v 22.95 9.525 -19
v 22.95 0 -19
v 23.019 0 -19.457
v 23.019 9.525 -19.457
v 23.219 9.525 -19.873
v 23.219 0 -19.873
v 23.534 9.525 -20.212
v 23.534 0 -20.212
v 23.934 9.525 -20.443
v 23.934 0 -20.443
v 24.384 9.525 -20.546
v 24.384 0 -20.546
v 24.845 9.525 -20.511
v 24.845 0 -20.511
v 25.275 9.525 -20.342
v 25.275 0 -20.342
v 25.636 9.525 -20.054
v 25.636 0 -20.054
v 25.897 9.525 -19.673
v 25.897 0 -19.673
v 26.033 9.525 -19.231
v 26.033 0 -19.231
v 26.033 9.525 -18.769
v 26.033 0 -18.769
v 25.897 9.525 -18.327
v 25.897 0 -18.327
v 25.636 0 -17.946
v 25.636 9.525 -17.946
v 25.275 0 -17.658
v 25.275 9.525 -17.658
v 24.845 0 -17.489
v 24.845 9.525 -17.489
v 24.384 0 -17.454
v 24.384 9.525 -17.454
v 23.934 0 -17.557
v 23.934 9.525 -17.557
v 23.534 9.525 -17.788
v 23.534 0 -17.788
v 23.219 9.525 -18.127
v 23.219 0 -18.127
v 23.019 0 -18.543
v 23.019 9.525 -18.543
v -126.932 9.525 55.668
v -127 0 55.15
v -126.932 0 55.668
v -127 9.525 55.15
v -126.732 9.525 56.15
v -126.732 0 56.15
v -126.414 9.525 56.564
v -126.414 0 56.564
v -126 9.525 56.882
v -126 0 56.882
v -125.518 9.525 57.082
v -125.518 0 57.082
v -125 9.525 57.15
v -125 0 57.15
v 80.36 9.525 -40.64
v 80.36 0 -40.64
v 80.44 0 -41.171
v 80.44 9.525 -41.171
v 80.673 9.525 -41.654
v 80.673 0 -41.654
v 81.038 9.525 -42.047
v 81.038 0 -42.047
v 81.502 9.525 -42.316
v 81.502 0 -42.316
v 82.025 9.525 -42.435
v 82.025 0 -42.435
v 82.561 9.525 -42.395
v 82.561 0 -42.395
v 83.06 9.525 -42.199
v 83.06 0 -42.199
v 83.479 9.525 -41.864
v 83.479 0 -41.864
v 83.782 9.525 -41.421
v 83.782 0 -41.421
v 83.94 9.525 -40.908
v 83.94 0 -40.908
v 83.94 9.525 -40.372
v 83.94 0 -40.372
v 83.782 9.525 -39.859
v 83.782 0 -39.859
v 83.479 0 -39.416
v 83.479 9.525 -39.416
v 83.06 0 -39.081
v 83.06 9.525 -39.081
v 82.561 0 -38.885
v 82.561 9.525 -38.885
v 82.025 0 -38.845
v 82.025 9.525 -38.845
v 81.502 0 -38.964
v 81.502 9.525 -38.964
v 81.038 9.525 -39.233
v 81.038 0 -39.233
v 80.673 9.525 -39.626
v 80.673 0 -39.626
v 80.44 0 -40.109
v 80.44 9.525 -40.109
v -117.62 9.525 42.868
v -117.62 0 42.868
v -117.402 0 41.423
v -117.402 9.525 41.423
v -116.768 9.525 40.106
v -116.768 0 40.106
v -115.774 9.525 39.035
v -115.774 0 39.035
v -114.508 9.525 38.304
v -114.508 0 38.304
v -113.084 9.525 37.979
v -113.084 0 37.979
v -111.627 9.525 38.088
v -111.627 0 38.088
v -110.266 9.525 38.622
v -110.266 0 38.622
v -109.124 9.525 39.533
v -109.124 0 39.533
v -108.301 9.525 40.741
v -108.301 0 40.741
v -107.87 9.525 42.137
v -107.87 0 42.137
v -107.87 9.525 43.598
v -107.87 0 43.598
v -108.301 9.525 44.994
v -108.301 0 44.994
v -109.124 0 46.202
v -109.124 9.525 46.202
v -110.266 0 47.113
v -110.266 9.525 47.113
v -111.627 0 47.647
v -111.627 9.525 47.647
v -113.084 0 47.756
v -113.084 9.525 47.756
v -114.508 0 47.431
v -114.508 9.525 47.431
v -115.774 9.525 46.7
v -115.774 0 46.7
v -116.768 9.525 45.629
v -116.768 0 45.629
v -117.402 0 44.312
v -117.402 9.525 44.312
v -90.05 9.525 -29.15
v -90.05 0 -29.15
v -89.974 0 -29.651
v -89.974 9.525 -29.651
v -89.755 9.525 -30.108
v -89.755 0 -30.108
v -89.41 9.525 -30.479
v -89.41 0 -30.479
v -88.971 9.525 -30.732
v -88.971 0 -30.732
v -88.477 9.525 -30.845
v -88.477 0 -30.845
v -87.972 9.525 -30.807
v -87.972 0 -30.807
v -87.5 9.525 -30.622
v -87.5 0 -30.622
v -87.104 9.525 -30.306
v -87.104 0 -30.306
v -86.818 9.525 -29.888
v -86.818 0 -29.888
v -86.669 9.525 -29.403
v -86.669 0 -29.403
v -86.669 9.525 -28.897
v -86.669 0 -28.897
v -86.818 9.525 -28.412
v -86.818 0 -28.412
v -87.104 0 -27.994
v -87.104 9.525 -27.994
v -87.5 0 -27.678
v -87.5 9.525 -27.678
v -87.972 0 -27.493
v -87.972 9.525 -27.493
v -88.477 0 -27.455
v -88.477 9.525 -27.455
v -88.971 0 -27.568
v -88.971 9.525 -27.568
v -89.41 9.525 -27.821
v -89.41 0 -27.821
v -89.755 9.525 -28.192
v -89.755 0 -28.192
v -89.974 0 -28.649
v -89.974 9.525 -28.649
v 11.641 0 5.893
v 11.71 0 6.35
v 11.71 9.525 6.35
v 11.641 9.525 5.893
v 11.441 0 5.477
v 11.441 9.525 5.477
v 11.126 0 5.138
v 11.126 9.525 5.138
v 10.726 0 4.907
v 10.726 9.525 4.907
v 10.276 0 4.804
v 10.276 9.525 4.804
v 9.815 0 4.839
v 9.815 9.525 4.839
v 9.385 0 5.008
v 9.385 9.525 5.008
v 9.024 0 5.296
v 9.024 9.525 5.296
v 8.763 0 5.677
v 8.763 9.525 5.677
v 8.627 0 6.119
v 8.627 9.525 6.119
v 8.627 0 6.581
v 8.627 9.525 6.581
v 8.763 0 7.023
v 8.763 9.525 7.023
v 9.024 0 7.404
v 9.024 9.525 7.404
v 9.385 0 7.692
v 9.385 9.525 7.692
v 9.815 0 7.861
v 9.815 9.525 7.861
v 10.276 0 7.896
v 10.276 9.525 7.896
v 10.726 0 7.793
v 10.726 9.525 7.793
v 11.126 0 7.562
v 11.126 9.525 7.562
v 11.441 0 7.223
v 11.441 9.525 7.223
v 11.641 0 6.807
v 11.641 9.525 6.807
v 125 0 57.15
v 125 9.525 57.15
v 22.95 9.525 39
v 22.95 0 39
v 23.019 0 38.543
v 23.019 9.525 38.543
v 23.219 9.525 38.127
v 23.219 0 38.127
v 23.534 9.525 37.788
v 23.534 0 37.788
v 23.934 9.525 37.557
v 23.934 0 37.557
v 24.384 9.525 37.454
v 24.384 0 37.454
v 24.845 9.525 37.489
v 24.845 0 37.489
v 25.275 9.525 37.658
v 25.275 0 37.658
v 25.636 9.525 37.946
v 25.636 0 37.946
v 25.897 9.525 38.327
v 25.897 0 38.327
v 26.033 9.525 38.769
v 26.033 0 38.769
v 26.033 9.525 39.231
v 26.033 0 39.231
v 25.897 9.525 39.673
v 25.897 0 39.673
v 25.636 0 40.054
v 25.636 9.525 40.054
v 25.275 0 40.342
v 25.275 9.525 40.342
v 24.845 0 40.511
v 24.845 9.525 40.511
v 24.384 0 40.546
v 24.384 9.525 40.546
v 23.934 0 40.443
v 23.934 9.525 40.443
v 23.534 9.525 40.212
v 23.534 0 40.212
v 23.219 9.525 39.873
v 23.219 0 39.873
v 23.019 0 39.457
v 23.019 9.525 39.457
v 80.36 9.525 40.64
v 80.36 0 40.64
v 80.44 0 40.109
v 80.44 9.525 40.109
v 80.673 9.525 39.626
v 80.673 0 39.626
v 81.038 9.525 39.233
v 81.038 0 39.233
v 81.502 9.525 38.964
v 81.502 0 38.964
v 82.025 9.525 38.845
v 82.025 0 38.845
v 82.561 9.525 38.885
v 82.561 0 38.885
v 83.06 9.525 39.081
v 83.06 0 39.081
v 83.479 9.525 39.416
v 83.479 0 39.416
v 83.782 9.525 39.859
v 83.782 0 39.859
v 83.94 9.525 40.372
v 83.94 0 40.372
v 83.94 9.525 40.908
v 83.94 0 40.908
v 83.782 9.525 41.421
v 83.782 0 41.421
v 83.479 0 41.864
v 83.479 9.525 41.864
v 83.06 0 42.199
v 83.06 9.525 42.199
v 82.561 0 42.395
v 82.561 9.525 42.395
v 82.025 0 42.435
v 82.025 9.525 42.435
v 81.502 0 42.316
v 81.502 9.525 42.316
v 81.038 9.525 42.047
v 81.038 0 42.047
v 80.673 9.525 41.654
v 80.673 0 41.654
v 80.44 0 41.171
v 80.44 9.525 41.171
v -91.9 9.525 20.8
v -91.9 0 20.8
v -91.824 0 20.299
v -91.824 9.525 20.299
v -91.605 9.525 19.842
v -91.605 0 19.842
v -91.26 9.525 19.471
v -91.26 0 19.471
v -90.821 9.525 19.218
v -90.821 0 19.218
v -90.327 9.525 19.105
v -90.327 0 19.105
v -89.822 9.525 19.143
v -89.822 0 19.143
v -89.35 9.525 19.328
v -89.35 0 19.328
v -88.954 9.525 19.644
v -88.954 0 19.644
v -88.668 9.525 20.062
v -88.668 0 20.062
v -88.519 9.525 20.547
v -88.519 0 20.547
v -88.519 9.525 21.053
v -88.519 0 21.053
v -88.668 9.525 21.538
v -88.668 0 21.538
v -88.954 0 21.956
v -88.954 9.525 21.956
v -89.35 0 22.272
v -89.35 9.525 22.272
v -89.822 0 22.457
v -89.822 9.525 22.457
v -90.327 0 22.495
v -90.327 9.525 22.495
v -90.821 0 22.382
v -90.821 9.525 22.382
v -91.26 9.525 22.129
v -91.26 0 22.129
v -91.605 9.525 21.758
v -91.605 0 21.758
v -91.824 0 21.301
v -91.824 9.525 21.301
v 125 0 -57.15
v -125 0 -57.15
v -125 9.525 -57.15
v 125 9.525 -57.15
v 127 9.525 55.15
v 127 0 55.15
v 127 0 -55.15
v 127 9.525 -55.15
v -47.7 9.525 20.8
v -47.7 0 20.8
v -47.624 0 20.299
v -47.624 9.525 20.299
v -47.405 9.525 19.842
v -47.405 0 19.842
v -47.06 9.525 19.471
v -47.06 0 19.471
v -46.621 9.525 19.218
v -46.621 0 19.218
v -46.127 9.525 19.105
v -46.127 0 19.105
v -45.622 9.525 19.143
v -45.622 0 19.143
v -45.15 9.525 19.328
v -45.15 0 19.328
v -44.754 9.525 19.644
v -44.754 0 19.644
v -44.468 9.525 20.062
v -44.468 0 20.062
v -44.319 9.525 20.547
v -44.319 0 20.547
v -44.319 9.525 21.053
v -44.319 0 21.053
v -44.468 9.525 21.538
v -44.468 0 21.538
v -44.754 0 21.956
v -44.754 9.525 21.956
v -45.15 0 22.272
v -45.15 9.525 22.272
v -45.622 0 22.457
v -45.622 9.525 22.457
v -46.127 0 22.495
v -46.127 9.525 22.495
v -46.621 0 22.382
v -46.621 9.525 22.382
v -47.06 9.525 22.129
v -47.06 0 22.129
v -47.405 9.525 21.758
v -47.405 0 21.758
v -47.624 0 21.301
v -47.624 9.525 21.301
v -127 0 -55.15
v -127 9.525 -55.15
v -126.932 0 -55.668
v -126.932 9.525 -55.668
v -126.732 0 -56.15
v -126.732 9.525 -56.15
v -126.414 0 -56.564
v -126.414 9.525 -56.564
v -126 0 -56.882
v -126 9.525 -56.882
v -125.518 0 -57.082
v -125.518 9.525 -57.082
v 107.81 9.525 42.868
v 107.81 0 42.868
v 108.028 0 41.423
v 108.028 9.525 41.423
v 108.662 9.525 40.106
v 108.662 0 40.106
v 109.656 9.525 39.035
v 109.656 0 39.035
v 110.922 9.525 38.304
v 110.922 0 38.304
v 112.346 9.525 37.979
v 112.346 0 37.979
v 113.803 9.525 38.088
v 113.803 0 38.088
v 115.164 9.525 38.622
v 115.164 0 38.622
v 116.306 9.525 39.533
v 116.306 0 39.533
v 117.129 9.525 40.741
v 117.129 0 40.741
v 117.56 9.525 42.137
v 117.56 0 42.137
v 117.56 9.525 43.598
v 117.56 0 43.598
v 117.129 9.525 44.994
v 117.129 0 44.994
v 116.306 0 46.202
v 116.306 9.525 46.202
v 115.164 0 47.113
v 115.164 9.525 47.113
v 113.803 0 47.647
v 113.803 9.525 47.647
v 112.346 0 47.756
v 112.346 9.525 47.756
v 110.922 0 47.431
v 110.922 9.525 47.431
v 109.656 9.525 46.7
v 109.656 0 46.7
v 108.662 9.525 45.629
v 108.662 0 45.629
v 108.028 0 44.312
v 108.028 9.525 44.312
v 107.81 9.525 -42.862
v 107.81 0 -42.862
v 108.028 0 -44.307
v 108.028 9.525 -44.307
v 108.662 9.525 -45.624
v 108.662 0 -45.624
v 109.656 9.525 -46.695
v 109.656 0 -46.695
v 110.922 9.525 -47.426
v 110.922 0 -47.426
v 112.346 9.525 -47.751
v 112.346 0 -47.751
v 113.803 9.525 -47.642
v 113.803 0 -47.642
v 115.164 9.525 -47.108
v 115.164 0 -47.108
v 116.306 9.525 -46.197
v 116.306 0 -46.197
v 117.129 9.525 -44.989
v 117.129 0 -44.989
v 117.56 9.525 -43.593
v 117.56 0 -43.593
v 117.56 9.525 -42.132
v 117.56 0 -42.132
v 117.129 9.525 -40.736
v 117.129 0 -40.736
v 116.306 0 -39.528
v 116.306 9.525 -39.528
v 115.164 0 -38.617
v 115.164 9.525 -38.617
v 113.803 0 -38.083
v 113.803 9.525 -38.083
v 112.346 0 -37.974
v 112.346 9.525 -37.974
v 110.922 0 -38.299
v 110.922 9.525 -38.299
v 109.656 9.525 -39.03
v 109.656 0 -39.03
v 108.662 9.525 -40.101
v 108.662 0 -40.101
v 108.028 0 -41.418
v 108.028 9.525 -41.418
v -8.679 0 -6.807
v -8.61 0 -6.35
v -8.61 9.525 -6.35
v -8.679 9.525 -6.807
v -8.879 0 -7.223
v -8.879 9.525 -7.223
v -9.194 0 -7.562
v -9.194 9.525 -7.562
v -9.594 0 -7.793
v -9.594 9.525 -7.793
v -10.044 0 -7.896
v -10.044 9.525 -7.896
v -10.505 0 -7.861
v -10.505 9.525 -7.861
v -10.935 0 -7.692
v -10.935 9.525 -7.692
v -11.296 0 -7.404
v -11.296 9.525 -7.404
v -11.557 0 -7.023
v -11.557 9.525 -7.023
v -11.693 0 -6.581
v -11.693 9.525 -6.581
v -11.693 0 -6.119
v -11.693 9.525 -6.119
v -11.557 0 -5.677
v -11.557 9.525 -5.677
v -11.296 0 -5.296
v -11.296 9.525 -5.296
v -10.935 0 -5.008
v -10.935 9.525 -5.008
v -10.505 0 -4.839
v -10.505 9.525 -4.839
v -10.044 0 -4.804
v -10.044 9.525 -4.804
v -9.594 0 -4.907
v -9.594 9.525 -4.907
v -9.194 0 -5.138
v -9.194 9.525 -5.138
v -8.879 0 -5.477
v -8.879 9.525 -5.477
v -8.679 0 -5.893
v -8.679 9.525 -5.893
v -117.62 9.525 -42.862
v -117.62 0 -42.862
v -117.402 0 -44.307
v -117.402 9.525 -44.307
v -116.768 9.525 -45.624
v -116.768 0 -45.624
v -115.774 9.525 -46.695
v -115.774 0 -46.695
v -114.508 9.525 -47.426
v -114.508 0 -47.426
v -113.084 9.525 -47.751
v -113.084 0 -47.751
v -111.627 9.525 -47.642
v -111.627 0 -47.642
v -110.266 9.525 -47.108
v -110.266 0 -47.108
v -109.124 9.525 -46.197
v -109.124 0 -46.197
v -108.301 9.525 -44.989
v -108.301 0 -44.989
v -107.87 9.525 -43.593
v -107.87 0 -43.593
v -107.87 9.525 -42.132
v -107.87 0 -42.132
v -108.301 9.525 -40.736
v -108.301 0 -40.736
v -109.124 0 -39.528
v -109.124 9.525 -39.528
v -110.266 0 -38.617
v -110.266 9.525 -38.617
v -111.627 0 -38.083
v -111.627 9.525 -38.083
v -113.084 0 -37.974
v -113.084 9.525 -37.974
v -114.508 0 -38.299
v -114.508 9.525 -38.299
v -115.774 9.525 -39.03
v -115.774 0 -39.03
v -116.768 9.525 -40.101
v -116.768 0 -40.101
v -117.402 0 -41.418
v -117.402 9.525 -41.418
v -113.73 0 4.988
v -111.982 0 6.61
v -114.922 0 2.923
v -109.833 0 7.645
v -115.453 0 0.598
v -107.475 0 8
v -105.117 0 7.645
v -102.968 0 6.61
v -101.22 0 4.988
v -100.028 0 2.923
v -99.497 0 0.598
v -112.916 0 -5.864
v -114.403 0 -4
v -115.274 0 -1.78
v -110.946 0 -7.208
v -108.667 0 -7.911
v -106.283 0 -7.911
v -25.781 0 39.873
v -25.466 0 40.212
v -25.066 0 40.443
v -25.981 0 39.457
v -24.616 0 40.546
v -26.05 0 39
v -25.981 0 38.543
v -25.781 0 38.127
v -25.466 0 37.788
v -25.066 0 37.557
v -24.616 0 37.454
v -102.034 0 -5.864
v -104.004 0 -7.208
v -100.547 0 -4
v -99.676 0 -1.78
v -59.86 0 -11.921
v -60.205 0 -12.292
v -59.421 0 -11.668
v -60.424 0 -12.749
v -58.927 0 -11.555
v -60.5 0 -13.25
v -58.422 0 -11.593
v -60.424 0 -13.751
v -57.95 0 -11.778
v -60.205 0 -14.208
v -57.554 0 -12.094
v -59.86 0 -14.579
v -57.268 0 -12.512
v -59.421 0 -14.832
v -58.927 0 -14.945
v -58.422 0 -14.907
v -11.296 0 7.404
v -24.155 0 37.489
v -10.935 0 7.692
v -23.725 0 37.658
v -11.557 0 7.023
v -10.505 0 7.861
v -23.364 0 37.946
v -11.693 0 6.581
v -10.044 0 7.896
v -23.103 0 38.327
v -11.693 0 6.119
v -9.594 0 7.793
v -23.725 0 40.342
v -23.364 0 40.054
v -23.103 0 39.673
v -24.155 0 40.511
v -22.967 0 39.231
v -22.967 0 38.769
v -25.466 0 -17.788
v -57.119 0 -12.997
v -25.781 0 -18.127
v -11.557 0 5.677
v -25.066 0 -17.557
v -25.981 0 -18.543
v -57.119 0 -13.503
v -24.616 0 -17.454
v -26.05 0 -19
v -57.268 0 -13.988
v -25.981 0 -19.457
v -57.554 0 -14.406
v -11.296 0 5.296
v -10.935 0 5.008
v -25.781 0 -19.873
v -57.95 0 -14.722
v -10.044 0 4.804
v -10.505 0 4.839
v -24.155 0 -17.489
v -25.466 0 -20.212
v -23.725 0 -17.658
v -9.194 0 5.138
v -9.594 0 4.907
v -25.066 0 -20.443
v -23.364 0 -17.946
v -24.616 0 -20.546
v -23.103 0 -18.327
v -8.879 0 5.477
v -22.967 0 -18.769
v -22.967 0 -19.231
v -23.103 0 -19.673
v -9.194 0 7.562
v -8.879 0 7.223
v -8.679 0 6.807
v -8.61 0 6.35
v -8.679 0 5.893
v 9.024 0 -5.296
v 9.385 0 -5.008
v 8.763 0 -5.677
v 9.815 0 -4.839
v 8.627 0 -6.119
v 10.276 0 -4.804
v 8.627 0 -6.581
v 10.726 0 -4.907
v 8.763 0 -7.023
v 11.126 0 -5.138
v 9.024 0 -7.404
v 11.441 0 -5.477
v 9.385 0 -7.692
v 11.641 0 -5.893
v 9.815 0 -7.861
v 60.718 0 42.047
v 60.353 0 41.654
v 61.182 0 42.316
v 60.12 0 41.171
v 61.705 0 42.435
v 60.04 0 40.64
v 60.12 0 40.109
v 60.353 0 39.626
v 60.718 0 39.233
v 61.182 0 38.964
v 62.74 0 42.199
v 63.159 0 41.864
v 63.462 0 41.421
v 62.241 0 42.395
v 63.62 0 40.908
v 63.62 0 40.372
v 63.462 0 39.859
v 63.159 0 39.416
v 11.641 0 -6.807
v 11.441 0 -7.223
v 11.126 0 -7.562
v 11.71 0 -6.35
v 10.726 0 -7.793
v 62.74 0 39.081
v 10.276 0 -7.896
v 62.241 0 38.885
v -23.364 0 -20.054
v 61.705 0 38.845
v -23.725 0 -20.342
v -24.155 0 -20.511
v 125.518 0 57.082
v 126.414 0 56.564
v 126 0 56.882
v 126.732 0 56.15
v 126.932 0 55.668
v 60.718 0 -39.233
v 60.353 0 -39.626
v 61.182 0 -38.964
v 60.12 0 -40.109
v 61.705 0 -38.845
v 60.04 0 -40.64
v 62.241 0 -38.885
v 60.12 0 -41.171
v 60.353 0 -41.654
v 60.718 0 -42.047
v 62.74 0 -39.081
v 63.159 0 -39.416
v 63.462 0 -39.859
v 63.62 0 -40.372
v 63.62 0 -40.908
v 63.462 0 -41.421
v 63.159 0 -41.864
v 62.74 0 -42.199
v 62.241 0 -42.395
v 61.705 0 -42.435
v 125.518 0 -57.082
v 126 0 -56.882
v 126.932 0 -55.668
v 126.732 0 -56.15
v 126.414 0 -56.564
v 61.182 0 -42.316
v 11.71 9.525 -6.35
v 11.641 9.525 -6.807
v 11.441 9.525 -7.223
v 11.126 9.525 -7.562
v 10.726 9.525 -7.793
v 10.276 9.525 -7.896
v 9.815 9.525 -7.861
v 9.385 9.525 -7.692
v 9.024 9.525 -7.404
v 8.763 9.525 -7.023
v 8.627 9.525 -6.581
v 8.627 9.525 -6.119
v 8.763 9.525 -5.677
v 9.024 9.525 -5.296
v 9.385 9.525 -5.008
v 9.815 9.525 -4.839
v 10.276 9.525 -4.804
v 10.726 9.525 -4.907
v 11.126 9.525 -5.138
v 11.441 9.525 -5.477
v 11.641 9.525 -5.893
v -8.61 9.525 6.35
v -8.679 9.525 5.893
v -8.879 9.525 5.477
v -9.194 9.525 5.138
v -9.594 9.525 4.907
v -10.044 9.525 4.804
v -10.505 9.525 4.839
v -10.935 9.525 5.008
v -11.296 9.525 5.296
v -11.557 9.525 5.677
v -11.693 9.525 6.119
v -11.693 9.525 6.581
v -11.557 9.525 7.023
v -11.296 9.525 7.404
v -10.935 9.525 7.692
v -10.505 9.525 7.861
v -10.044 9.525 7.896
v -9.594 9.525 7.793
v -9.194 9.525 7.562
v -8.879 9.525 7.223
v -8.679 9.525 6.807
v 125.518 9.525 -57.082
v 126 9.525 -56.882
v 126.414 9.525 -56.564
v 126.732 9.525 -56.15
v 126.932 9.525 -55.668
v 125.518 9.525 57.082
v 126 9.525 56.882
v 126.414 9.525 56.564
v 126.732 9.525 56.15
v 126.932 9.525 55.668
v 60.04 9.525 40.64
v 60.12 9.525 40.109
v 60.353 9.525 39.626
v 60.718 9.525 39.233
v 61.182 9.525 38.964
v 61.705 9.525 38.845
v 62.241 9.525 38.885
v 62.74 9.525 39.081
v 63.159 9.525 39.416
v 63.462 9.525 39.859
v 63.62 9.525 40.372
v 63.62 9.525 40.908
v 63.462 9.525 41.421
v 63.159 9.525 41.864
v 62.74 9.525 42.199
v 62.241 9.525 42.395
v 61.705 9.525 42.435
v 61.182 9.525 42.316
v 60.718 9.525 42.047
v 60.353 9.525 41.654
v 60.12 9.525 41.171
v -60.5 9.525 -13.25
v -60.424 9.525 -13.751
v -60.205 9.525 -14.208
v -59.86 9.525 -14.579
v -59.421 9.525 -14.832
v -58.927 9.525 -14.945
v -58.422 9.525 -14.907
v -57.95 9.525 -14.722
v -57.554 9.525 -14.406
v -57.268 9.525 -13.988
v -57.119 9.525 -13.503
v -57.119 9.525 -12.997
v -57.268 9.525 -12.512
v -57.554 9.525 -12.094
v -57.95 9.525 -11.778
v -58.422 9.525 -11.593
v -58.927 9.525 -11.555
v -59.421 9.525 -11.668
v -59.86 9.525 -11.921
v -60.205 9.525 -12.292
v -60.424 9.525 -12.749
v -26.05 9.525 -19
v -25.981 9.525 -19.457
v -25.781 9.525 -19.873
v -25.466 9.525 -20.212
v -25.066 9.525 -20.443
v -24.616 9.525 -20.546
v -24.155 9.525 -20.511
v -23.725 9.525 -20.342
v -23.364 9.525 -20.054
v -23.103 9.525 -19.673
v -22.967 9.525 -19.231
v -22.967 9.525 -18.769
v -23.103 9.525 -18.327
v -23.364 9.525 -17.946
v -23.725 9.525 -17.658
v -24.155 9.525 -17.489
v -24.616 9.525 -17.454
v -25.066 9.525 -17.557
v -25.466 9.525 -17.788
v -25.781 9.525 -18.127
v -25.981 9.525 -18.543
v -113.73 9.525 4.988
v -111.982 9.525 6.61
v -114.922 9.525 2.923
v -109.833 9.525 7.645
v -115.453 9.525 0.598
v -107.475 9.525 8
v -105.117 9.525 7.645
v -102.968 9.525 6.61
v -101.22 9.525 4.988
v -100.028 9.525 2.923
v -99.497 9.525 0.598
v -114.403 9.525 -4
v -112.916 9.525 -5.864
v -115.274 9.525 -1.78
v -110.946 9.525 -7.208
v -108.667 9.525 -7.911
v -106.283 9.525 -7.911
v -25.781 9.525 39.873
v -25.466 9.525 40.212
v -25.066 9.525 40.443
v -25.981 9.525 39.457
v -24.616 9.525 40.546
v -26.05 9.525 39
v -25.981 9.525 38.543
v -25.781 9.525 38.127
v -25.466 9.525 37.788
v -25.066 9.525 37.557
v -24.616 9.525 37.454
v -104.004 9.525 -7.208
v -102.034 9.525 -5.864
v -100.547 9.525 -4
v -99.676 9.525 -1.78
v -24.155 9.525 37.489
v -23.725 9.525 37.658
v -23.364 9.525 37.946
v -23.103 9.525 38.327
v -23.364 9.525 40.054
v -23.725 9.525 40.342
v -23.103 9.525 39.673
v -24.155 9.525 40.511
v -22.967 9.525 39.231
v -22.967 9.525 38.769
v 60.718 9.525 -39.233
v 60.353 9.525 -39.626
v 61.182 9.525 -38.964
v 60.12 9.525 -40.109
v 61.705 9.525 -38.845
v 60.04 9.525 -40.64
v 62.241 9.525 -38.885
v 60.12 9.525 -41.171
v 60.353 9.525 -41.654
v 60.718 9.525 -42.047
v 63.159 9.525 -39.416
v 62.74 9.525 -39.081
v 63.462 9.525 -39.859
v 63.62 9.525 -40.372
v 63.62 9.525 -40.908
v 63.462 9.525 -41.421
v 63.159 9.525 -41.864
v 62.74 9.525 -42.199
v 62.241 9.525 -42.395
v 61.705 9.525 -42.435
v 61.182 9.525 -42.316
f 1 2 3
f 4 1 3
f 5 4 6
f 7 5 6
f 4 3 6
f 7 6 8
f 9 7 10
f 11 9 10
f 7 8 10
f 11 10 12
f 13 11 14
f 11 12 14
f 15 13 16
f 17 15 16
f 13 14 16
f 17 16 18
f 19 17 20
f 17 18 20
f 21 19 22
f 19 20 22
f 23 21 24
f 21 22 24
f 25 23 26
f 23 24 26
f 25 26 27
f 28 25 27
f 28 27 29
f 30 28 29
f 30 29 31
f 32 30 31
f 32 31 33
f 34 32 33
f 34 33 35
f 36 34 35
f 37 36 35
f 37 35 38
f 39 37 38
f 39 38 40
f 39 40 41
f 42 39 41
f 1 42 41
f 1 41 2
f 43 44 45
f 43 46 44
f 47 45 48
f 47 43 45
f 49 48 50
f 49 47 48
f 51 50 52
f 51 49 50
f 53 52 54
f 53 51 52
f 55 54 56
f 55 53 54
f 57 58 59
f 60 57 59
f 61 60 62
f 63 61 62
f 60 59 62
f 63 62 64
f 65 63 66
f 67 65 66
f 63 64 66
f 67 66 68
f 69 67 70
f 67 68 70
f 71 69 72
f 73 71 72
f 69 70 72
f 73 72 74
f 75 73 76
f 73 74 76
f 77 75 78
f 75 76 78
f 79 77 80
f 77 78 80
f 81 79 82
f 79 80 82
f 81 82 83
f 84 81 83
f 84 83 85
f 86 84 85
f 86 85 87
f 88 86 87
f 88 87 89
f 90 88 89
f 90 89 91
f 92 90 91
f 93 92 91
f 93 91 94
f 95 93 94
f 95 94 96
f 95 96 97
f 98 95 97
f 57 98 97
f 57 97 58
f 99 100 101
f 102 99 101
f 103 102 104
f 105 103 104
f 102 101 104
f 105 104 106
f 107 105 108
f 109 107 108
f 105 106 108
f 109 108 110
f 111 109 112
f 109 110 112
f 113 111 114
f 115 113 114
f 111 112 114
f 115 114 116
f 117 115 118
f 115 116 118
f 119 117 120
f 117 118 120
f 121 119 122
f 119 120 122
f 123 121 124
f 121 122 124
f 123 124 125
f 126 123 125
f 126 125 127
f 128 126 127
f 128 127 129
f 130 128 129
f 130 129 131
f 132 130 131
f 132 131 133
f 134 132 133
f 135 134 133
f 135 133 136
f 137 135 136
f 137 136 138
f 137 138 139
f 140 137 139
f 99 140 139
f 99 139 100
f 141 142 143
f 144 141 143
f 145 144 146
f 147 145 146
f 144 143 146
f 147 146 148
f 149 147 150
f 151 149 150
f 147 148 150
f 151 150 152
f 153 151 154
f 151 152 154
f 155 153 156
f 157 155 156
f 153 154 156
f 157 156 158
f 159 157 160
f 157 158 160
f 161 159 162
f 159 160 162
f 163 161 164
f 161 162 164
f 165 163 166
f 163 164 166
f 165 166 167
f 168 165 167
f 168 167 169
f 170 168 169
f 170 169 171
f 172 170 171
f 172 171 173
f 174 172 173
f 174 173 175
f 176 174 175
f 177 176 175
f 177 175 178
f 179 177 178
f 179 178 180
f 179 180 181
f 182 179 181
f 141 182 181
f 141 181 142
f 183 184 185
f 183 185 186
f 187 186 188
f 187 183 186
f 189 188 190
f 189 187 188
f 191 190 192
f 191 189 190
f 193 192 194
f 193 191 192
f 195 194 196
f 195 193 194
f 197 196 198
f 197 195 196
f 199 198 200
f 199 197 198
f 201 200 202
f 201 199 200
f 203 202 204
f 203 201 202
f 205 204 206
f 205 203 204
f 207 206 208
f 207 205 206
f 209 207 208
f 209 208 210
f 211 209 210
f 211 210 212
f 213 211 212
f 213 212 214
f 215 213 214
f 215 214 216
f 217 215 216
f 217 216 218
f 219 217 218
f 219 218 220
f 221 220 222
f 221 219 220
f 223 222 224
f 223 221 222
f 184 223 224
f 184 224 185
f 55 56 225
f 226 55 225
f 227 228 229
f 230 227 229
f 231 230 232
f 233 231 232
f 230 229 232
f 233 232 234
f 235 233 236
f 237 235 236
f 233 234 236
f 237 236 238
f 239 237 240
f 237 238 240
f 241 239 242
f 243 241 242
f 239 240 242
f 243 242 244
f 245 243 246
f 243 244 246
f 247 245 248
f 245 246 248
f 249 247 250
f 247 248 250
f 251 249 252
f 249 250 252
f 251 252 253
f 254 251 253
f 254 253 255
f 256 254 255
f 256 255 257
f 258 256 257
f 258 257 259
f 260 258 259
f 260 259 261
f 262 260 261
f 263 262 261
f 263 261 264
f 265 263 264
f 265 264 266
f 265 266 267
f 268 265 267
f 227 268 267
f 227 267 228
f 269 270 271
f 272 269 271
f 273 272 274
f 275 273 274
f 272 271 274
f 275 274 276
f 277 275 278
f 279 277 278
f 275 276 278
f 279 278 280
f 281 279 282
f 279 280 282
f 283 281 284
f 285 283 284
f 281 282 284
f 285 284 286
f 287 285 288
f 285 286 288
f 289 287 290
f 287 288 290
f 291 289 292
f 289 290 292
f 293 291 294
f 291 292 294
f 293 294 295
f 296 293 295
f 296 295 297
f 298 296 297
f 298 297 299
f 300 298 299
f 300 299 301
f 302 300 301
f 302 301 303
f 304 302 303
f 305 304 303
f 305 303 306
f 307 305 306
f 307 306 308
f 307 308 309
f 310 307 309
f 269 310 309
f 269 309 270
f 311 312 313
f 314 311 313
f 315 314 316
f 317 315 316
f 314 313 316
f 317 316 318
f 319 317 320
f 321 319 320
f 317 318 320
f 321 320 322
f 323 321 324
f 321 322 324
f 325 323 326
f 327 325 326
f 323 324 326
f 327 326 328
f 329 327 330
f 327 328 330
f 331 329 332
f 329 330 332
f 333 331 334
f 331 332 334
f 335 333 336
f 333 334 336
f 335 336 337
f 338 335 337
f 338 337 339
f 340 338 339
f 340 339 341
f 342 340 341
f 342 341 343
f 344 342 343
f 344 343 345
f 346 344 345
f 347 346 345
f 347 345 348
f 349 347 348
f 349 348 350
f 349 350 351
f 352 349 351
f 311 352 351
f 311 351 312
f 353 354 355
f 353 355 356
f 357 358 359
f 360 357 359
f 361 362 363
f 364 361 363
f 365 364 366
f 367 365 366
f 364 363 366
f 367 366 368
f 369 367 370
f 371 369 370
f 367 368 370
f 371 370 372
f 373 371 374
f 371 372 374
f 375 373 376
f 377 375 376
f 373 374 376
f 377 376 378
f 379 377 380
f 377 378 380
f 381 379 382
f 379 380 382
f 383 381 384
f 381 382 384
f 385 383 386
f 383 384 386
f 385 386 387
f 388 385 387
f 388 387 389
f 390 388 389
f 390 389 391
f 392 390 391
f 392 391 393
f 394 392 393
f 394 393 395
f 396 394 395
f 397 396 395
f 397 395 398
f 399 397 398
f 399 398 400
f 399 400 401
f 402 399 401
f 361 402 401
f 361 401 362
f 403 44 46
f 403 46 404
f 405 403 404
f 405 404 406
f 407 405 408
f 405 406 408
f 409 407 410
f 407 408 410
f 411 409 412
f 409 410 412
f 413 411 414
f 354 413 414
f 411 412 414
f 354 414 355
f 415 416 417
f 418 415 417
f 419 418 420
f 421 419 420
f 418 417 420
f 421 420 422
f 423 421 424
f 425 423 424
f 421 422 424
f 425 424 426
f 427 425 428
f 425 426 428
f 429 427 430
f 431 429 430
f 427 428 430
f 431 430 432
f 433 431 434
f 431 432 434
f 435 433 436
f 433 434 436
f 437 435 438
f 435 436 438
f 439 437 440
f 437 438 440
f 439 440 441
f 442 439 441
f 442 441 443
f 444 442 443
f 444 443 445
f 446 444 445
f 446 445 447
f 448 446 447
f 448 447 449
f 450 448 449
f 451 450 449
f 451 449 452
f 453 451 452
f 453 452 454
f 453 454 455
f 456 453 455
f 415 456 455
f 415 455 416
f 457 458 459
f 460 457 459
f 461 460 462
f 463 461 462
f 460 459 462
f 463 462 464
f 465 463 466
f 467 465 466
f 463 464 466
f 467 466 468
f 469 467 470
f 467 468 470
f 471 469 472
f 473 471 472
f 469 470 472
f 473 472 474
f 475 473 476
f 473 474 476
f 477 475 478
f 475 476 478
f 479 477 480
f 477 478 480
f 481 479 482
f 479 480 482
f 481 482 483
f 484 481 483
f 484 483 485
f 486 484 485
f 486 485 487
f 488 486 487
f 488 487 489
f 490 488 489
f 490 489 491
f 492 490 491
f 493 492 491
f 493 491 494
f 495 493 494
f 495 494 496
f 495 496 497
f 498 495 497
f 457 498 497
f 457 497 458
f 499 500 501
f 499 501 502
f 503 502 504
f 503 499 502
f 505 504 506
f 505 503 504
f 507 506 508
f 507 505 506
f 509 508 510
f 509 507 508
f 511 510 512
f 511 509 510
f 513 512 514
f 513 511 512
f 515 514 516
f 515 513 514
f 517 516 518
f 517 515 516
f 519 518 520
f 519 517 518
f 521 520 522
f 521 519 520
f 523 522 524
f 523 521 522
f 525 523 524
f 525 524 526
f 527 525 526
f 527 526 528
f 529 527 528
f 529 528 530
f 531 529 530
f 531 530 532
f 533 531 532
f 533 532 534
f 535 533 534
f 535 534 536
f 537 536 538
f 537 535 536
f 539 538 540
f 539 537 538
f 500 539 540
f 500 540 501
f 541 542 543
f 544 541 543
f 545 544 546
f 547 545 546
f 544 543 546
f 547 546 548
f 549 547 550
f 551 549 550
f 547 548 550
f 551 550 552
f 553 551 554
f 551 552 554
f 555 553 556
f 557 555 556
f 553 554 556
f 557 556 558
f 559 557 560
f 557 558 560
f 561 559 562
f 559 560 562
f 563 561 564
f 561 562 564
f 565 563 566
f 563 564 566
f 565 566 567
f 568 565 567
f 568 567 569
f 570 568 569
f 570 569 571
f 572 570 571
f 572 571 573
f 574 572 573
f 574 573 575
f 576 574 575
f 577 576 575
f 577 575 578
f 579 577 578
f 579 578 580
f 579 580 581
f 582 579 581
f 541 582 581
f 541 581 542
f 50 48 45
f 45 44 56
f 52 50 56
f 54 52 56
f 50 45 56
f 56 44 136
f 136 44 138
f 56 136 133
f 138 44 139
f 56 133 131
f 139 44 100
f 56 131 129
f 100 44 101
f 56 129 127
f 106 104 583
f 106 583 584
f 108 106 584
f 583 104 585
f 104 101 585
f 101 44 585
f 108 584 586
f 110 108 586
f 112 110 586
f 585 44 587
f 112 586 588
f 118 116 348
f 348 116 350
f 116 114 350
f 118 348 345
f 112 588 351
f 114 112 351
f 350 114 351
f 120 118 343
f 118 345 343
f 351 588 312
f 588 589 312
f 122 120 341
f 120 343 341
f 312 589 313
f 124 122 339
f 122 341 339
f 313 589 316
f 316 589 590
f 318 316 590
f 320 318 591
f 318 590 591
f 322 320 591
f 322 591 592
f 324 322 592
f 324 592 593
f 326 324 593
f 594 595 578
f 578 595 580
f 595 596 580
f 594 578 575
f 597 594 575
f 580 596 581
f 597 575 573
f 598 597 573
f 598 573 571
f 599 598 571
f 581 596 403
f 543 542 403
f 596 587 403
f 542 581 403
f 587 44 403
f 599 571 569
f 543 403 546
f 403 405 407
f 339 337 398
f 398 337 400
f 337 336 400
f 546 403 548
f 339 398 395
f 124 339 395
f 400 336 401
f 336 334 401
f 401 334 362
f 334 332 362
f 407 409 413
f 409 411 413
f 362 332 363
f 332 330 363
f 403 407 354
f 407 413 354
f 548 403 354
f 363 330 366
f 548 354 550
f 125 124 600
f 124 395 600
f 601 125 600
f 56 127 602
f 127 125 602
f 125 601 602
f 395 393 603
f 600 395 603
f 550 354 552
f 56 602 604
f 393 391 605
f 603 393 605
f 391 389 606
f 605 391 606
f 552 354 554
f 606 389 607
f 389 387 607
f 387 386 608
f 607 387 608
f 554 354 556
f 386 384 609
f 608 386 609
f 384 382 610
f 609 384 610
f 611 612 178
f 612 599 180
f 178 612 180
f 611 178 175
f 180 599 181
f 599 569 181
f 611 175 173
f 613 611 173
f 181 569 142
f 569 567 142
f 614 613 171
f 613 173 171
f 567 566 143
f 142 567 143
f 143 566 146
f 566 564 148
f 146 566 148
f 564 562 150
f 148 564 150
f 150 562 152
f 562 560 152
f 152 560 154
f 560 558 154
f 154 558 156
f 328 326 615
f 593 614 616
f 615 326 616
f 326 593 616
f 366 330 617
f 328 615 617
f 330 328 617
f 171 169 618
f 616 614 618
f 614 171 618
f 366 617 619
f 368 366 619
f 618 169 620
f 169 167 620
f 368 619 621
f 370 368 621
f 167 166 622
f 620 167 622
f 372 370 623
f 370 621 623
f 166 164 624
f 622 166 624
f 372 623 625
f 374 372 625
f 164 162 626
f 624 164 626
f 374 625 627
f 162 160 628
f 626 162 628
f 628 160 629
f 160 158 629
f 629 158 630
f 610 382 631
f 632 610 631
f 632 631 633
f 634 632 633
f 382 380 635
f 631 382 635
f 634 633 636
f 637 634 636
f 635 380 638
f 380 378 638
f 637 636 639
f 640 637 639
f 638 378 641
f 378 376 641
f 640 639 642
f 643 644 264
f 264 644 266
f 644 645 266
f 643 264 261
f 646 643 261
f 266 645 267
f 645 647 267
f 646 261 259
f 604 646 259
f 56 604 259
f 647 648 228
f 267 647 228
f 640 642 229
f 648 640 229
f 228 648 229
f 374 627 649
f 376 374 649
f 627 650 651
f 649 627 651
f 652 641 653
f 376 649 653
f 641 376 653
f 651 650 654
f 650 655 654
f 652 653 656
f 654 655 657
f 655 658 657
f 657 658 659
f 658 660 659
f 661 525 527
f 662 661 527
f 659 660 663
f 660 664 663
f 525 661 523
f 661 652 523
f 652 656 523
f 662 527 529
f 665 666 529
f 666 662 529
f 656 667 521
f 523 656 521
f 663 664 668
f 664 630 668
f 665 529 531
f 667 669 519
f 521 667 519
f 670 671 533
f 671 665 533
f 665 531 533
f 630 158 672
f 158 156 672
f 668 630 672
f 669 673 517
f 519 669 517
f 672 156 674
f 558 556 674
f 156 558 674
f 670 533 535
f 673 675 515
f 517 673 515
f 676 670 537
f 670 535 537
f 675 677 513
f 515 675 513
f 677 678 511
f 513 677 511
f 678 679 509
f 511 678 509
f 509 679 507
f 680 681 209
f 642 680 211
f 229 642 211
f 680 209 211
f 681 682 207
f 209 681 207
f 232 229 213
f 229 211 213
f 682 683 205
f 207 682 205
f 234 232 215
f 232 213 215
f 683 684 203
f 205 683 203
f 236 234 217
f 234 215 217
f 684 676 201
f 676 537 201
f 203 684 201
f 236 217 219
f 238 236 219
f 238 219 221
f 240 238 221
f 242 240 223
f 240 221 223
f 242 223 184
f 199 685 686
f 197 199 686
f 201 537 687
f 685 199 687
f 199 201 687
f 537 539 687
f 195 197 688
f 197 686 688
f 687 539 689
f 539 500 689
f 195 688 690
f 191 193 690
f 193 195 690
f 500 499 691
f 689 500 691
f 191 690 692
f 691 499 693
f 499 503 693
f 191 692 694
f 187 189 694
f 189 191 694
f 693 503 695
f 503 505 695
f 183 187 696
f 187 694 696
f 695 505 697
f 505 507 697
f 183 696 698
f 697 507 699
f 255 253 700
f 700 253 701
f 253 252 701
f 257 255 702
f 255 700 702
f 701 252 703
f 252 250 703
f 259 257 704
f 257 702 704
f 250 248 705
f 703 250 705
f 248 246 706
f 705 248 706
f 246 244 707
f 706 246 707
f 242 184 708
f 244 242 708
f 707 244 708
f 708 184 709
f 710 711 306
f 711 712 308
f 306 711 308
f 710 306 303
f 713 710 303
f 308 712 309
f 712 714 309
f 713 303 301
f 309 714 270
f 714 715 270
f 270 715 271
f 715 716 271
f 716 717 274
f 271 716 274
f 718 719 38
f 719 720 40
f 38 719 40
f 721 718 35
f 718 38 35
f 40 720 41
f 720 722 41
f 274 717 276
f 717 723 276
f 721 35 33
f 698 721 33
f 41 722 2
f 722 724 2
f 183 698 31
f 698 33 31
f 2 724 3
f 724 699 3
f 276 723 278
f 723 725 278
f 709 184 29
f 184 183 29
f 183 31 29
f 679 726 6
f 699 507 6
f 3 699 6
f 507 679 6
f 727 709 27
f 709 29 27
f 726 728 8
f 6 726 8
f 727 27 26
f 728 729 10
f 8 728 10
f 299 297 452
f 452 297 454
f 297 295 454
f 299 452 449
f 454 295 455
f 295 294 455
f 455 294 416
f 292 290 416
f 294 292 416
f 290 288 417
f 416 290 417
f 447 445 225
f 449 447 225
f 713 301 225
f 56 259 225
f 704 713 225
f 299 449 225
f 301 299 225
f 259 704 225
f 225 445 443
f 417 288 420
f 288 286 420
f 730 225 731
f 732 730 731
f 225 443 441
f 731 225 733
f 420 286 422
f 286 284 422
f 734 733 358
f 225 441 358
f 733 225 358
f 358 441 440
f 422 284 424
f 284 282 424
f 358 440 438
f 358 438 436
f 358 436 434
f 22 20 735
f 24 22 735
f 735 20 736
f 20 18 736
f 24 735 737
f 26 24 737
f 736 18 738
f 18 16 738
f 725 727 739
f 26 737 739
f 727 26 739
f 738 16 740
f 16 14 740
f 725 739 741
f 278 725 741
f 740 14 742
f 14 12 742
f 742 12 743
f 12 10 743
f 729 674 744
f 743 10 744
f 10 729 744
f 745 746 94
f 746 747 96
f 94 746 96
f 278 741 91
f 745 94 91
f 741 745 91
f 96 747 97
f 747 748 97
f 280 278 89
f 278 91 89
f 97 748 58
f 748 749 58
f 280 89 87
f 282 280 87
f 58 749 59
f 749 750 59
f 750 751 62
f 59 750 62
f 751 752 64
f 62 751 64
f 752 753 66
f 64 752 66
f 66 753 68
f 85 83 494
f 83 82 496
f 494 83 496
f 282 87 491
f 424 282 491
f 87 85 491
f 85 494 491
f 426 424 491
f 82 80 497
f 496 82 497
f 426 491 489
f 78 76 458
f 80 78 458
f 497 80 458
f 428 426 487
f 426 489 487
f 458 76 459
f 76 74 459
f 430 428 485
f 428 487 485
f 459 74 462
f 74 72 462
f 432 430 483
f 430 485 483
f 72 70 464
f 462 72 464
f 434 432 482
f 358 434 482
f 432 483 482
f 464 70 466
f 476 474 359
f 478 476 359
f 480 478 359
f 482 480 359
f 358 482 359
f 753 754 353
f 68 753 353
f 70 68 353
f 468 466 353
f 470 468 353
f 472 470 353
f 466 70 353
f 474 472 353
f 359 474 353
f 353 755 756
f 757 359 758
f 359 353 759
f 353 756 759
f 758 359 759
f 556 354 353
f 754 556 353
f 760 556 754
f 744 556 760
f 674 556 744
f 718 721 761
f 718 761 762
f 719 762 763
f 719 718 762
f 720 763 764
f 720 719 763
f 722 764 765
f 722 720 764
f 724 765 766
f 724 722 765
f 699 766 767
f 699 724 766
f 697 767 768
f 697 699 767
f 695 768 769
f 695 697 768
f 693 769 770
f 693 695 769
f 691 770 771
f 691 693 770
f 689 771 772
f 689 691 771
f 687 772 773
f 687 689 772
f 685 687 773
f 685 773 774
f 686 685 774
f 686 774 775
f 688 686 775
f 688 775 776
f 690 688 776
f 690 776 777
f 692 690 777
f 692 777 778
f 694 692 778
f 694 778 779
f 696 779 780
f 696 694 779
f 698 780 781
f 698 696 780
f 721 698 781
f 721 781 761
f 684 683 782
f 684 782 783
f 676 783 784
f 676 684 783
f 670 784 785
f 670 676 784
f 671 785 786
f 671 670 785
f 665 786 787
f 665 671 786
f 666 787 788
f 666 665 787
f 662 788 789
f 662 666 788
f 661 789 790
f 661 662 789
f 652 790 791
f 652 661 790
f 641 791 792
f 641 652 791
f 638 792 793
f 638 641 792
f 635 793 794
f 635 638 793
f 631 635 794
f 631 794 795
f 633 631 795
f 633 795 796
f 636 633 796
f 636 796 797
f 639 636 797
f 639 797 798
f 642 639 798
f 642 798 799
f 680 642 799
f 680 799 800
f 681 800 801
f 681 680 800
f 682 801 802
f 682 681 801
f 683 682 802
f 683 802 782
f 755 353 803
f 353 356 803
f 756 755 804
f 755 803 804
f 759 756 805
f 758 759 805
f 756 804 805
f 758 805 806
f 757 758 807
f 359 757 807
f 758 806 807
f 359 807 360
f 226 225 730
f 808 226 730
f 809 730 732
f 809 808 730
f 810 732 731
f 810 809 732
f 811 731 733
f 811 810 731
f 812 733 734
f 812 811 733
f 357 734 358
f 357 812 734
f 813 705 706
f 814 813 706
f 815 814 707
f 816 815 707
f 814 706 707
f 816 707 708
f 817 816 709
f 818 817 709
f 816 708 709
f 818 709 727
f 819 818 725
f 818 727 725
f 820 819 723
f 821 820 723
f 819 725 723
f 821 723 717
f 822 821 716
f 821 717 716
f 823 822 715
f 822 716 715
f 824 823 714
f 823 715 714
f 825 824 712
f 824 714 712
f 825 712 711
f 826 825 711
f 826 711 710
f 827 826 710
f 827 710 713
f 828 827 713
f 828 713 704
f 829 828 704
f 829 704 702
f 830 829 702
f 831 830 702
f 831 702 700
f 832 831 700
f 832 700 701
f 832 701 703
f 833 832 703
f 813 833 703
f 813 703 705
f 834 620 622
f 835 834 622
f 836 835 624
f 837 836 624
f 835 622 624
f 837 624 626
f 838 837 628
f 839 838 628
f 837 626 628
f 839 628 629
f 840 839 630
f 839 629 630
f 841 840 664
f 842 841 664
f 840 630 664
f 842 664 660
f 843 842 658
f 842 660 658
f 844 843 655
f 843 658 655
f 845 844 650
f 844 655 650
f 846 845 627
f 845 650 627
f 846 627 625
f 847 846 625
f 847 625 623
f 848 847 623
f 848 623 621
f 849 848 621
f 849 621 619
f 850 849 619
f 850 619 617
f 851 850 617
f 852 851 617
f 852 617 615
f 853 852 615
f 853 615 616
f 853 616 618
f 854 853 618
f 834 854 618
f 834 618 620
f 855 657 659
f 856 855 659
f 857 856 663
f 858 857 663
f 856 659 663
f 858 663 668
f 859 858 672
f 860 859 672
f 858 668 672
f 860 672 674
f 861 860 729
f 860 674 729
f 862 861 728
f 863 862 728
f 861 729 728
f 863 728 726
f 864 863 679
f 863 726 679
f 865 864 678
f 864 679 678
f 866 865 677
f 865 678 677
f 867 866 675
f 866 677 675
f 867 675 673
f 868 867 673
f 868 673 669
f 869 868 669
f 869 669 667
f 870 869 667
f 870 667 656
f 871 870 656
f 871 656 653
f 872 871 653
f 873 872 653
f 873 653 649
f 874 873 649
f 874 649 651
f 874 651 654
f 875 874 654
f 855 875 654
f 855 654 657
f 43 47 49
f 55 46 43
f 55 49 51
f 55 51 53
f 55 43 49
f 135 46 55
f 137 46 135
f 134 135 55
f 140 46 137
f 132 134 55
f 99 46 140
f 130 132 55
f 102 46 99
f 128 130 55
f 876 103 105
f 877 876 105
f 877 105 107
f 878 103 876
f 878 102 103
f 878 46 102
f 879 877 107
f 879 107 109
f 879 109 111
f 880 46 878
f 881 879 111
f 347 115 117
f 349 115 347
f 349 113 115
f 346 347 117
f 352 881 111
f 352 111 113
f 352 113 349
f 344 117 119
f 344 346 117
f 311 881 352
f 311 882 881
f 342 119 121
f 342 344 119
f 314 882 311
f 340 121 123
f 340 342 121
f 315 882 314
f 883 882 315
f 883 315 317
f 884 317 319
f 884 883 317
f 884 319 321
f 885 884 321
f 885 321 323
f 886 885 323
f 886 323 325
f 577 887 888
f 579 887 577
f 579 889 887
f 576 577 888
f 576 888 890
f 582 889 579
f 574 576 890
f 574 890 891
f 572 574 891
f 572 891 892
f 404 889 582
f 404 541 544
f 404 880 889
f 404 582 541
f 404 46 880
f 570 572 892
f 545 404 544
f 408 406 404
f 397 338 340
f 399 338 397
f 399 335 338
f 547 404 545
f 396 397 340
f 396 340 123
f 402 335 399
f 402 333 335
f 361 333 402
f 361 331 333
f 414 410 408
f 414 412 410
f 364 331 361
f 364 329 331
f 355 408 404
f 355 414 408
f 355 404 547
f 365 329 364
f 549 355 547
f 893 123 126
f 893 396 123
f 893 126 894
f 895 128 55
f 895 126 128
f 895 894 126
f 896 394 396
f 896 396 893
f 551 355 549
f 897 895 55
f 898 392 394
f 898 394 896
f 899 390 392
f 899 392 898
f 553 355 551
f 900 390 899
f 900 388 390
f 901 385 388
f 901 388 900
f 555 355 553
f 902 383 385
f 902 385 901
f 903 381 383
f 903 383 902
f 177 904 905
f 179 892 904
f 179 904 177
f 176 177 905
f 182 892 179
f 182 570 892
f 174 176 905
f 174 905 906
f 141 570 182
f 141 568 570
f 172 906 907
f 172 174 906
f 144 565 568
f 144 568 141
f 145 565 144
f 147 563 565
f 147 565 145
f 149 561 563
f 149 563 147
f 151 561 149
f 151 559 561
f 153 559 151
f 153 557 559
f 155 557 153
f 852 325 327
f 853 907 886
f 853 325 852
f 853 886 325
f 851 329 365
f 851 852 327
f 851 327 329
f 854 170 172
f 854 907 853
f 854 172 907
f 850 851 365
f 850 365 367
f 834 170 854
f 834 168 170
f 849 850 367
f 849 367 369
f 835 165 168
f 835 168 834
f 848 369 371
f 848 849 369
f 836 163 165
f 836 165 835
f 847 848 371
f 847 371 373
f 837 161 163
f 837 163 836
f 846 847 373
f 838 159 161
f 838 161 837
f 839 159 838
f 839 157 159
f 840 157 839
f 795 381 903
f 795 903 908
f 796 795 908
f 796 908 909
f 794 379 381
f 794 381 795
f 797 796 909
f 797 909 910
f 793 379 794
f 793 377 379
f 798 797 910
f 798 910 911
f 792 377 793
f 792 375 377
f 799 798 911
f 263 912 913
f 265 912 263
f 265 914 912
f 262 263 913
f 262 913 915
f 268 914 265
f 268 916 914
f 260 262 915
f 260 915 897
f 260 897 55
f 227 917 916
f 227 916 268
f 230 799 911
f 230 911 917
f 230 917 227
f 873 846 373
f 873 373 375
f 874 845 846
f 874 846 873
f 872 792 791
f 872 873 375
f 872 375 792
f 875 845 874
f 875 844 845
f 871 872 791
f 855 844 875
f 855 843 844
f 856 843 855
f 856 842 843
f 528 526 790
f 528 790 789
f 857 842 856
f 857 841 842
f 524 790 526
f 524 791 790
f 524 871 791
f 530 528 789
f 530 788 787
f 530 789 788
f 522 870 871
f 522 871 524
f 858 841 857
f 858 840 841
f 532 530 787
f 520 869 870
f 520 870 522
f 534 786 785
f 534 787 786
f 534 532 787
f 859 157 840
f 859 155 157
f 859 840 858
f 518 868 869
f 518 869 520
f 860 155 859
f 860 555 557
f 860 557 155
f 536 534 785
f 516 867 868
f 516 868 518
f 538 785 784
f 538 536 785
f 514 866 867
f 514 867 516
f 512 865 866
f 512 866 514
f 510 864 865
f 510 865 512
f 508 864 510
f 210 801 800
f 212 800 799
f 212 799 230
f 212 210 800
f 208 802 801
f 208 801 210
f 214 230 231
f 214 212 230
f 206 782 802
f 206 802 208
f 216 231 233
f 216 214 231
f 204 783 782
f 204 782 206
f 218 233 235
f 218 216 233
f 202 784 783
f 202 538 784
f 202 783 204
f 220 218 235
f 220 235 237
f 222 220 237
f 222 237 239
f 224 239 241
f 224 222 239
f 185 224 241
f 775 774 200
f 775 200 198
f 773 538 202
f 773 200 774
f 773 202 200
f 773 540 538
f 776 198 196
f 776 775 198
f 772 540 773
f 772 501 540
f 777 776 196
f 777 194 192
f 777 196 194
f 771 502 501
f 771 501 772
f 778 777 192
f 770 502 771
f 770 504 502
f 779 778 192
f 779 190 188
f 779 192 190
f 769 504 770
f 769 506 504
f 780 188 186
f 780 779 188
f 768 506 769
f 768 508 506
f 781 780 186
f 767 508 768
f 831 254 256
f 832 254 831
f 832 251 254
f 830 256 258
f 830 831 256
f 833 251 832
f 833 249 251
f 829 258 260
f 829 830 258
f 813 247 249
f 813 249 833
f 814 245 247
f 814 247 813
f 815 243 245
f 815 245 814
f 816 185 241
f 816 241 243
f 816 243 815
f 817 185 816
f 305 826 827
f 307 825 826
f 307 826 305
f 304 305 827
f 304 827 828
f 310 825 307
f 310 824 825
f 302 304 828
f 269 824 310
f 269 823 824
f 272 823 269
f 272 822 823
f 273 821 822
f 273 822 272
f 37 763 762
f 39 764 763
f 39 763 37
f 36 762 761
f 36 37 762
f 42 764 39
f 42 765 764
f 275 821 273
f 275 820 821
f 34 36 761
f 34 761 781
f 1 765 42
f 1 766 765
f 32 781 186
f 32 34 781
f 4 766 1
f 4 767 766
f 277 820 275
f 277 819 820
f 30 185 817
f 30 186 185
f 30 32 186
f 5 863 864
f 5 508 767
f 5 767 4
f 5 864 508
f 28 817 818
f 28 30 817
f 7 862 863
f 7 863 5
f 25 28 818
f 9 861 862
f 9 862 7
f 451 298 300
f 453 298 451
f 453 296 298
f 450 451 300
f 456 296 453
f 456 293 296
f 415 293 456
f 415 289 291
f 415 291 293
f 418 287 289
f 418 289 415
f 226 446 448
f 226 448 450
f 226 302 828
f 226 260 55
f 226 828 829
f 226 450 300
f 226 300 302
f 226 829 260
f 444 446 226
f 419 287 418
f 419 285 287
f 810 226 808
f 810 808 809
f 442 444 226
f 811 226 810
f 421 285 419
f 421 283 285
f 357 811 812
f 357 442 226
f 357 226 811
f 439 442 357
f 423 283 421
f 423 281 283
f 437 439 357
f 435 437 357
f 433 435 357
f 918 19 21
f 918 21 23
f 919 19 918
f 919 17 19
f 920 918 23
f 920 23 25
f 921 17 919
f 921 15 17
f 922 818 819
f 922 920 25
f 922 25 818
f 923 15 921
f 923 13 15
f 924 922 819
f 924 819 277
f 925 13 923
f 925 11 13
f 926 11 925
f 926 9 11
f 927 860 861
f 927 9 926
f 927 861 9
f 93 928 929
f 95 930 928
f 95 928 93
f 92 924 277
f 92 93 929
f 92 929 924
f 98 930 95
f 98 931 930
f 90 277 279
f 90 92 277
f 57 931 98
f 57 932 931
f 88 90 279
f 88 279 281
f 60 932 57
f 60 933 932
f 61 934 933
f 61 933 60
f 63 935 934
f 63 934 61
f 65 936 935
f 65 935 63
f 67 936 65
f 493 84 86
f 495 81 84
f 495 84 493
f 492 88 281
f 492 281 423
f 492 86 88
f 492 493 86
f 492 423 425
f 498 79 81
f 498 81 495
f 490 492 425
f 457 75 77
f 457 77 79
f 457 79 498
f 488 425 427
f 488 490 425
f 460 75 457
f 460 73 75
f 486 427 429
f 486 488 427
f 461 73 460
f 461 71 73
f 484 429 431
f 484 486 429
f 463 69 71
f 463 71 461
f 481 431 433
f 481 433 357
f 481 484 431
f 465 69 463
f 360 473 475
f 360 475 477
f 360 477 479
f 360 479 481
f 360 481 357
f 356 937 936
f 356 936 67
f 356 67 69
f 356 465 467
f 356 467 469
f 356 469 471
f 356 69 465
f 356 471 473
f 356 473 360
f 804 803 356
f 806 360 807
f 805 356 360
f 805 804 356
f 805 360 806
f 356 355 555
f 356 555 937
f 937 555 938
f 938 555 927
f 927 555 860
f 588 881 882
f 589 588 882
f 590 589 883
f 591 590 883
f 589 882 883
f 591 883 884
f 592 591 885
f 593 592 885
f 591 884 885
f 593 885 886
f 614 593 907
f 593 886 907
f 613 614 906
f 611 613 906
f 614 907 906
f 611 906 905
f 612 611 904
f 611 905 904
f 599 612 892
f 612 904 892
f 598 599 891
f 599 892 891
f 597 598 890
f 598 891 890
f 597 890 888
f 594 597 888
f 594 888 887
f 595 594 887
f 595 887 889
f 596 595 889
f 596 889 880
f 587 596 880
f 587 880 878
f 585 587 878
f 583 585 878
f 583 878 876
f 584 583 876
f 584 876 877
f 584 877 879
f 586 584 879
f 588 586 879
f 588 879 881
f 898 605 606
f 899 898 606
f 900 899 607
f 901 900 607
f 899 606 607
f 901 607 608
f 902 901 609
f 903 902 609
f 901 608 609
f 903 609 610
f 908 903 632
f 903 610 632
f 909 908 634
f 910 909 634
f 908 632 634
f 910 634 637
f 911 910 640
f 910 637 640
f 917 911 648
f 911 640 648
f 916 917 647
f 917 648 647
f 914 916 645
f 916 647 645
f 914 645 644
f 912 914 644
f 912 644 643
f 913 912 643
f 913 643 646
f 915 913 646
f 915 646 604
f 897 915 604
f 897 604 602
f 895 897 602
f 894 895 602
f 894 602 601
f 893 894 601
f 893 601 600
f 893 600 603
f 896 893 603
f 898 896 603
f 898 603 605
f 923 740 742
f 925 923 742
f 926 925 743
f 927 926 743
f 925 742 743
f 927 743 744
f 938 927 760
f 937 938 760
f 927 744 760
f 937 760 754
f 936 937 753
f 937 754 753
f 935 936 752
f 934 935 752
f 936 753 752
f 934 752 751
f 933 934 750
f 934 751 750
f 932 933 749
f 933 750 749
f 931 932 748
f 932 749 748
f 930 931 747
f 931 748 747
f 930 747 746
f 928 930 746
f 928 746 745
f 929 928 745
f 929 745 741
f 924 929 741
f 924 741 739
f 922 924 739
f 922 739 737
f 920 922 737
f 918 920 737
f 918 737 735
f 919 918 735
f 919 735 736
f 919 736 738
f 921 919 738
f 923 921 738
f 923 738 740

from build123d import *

# Parameters (mm, degrees)
SKETCH1_W                      = 254
SKETCH1_H                      = 114.3
BOSS_EXTRUDE1_DEPTH            = 9.525
F_3_8_CLEARANCE_HOLE1_D        = 9.8044
F_3_8_CLEARANCE_HOLE1_DEPTH    = 10
F_3_8_CLEARANCE_HOLE1_TIP      = 2.945538927
M2_5_CLEARANCE_HOLE3_D         = 3.1
M2_5_CLEARANCE_HOLE3_DEPTH     = 10
M2_5_CLEARANCE_HOLE3_TIP       = 0.931333959
FILLET1_R                      = 2
M3_CLEARANCE_HOLE4_D           = 3.4
M3_CLEARANCE_HOLE4_DEPTH       = 10
M3_CLEARANCE_HOLE4_TIP         = 1.021463052
SKETCH22_R                     = 8
CUT_EXTRUDE1_DEPTH             = 140.5917194
M3_CLEARANCE_HOLE5_D           = 3.6
M3_CLEARANCE_HOLE5_DEPTH       = 10
M3_CLEARANCE_HOLE5_TIP         = 1.081549114
M2_5_CLEARANCE_HOLE4_OUTLINE_R = 1.55
M2_5_CLEARANCE_HOLE4_DEPTH     = 9.525


# Read off the part's stored shape, not the designer's step: M2.5 Clearance Hole4
with BuildPart() as part:
    # Sketch1 → Boss-Extrude1 (new body)
    with BuildSketch(Plane(origin=(0, 0, 0), x_dir=(1, 0, 0), z_dir=(0, 1, 0))):
        Rectangle(SKETCH1_W, SKETCH1_H)
    extrude(amount=BOSS_EXTRUDE1_DEPTH)

    # 3/8 Clearance Hole1
    with Locations(Plane(origin=(0, 9.525, 0), x_dir=(1, 0, 0), z_dir=(0, 1, 0))):
        with Locations((112.7125, 42.8625), (112.7125, -42.8675), (-112.7175, 42.8625), (-112.7175, -42.8675)):
            Hole(F_3_8_CLEARANCE_HOLE1_D / 2, depth=F_3_8_CLEARANCE_HOLE1_DEPTH)
            with Locations((0, 0, -(F_3_8_CLEARANCE_HOLE1_DEPTH + F_3_8_CLEARANCE_HOLE1_TIP / 2))):  # 118° drill point
                Cone(0, F_3_8_CLEARANCE_HOLE1_D / 2, F_3_8_CLEARANCE_HOLE1_TIP, mode=Mode.SUBTRACT)

    # M2.5 Clearance Hole3
    with Locations(Plane(origin=(0, 9.525, 0), x_dir=(1, 0, 0), z_dir=(0, 1, 0))):
        with Locations((24.5, 19), (-24.5, -39), (24.5, -39), (-24.5, 19)):
            Hole(M2_5_CLEARANCE_HOLE3_D / 2, depth=M2_5_CLEARANCE_HOLE3_DEPTH)
            with Locations((0, 0, -(M2_5_CLEARANCE_HOLE3_DEPTH + M2_5_CLEARANCE_HOLE3_TIP / 2))):  # 118° drill point
                Cone(0, M2_5_CLEARANCE_HOLE3_D / 2, M2_5_CLEARANCE_HOLE3_TIP, mode=Mode.SUBTRACT)

    # Fillet1
    fillet1_edges = [part.edges().sort_by_distance(p)[0] for p in [
        (127, 4.7625, 57.15),
        (-127, 4.7625, 57.15),
        (-127, 4.7625, -57.15),
        (127, 4.7625, -57.15),
    ]]
    fillet(fillet1_edges, radius=FILLET1_R)

    # M3 Clearance Hole4
    with Locations(Plane(origin=(0, 9.525, 0), x_dir=(1, 0, 0), z_dir=(0, 1, 0))):
        with Locations((-90.2, -20.8), (-88.35, 29.15), (-58.8, 13.25), (-46, -20.8)):
            Hole(M3_CLEARANCE_HOLE4_D / 2, depth=M3_CLEARANCE_HOLE4_DEPTH)
            with Locations((0, 0, -(M3_CLEARANCE_HOLE4_DEPTH + M3_CLEARANCE_HOLE4_TIP / 2))):  # 118° drill point
                Cone(0, M3_CLEARANCE_HOLE4_D / 2, M3_CLEARANCE_HOLE4_TIP, mode=Mode.SUBTRACT)

    # Sketch22 → Cut-Extrude1 (cut, through all)
    with BuildSketch(Plane(origin=(0, 9.525, 0), x_dir=(1, 0, 0), z_dir=(0, 1, 0))):
        with Locations(Location((-107.475, 0, 0), (0, 0, 270))):
            Circle(SKETCH22_R)
    extrude(amount=-CUT_EXTRUDE1_DEPTH, mode=Mode.SUBTRACT)

    # M3 Clearance Hole5
    with Locations(Plane(origin=(0, 9.525, 0), x_dir=(1, 0, 0), z_dir=(0, 1, 0))):
        with Locations((61.84, 40.64), (61.84, -40.64), (82.16, -40.64), (82.16, 40.64)):
            Hole(M3_CLEARANCE_HOLE5_D / 2, depth=M3_CLEARANCE_HOLE5_DEPTH)
            with Locations((0, 0, -(M3_CLEARANCE_HOLE5_DEPTH + M3_CLEARANCE_HOLE5_TIP / 2))):  # 118° drill point
                Cone(0, M3_CLEARANCE_HOLE5_D / 2, M3_CLEARANCE_HOLE5_TIP, mode=Mode.SUBTRACT)

    # M2.5 Clearance Hole4 outline → M2.5 Clearance Hole4 (cut)
    with BuildSketch(Plane(origin=(0, 0, 0), x_dir=(1, 0, 0), z_dir=(0, 1, 0))):
        with Locations((-10.16, 6.35)):
            Circle(M2_5_CLEARANCE_HOLE4_OUTLINE_R)
        with Locations((10.16, 6.35)):
            Circle(M2_5_CLEARANCE_HOLE4_OUTLINE_R)
        with Locations((10.16, -6.35)):
            Circle(M2_5_CLEARANCE_HOLE4_OUTLINE_R)
        with Locations((-10.16, -6.35)):
            Circle(M2_5_CLEARANCE_HOLE4_OUTLINE_R)
    extrude(amount=M2_5_CLEARANCE_HOLE4_DEPTH, mode=Mode.SUBTRACT)


solid = part.part
